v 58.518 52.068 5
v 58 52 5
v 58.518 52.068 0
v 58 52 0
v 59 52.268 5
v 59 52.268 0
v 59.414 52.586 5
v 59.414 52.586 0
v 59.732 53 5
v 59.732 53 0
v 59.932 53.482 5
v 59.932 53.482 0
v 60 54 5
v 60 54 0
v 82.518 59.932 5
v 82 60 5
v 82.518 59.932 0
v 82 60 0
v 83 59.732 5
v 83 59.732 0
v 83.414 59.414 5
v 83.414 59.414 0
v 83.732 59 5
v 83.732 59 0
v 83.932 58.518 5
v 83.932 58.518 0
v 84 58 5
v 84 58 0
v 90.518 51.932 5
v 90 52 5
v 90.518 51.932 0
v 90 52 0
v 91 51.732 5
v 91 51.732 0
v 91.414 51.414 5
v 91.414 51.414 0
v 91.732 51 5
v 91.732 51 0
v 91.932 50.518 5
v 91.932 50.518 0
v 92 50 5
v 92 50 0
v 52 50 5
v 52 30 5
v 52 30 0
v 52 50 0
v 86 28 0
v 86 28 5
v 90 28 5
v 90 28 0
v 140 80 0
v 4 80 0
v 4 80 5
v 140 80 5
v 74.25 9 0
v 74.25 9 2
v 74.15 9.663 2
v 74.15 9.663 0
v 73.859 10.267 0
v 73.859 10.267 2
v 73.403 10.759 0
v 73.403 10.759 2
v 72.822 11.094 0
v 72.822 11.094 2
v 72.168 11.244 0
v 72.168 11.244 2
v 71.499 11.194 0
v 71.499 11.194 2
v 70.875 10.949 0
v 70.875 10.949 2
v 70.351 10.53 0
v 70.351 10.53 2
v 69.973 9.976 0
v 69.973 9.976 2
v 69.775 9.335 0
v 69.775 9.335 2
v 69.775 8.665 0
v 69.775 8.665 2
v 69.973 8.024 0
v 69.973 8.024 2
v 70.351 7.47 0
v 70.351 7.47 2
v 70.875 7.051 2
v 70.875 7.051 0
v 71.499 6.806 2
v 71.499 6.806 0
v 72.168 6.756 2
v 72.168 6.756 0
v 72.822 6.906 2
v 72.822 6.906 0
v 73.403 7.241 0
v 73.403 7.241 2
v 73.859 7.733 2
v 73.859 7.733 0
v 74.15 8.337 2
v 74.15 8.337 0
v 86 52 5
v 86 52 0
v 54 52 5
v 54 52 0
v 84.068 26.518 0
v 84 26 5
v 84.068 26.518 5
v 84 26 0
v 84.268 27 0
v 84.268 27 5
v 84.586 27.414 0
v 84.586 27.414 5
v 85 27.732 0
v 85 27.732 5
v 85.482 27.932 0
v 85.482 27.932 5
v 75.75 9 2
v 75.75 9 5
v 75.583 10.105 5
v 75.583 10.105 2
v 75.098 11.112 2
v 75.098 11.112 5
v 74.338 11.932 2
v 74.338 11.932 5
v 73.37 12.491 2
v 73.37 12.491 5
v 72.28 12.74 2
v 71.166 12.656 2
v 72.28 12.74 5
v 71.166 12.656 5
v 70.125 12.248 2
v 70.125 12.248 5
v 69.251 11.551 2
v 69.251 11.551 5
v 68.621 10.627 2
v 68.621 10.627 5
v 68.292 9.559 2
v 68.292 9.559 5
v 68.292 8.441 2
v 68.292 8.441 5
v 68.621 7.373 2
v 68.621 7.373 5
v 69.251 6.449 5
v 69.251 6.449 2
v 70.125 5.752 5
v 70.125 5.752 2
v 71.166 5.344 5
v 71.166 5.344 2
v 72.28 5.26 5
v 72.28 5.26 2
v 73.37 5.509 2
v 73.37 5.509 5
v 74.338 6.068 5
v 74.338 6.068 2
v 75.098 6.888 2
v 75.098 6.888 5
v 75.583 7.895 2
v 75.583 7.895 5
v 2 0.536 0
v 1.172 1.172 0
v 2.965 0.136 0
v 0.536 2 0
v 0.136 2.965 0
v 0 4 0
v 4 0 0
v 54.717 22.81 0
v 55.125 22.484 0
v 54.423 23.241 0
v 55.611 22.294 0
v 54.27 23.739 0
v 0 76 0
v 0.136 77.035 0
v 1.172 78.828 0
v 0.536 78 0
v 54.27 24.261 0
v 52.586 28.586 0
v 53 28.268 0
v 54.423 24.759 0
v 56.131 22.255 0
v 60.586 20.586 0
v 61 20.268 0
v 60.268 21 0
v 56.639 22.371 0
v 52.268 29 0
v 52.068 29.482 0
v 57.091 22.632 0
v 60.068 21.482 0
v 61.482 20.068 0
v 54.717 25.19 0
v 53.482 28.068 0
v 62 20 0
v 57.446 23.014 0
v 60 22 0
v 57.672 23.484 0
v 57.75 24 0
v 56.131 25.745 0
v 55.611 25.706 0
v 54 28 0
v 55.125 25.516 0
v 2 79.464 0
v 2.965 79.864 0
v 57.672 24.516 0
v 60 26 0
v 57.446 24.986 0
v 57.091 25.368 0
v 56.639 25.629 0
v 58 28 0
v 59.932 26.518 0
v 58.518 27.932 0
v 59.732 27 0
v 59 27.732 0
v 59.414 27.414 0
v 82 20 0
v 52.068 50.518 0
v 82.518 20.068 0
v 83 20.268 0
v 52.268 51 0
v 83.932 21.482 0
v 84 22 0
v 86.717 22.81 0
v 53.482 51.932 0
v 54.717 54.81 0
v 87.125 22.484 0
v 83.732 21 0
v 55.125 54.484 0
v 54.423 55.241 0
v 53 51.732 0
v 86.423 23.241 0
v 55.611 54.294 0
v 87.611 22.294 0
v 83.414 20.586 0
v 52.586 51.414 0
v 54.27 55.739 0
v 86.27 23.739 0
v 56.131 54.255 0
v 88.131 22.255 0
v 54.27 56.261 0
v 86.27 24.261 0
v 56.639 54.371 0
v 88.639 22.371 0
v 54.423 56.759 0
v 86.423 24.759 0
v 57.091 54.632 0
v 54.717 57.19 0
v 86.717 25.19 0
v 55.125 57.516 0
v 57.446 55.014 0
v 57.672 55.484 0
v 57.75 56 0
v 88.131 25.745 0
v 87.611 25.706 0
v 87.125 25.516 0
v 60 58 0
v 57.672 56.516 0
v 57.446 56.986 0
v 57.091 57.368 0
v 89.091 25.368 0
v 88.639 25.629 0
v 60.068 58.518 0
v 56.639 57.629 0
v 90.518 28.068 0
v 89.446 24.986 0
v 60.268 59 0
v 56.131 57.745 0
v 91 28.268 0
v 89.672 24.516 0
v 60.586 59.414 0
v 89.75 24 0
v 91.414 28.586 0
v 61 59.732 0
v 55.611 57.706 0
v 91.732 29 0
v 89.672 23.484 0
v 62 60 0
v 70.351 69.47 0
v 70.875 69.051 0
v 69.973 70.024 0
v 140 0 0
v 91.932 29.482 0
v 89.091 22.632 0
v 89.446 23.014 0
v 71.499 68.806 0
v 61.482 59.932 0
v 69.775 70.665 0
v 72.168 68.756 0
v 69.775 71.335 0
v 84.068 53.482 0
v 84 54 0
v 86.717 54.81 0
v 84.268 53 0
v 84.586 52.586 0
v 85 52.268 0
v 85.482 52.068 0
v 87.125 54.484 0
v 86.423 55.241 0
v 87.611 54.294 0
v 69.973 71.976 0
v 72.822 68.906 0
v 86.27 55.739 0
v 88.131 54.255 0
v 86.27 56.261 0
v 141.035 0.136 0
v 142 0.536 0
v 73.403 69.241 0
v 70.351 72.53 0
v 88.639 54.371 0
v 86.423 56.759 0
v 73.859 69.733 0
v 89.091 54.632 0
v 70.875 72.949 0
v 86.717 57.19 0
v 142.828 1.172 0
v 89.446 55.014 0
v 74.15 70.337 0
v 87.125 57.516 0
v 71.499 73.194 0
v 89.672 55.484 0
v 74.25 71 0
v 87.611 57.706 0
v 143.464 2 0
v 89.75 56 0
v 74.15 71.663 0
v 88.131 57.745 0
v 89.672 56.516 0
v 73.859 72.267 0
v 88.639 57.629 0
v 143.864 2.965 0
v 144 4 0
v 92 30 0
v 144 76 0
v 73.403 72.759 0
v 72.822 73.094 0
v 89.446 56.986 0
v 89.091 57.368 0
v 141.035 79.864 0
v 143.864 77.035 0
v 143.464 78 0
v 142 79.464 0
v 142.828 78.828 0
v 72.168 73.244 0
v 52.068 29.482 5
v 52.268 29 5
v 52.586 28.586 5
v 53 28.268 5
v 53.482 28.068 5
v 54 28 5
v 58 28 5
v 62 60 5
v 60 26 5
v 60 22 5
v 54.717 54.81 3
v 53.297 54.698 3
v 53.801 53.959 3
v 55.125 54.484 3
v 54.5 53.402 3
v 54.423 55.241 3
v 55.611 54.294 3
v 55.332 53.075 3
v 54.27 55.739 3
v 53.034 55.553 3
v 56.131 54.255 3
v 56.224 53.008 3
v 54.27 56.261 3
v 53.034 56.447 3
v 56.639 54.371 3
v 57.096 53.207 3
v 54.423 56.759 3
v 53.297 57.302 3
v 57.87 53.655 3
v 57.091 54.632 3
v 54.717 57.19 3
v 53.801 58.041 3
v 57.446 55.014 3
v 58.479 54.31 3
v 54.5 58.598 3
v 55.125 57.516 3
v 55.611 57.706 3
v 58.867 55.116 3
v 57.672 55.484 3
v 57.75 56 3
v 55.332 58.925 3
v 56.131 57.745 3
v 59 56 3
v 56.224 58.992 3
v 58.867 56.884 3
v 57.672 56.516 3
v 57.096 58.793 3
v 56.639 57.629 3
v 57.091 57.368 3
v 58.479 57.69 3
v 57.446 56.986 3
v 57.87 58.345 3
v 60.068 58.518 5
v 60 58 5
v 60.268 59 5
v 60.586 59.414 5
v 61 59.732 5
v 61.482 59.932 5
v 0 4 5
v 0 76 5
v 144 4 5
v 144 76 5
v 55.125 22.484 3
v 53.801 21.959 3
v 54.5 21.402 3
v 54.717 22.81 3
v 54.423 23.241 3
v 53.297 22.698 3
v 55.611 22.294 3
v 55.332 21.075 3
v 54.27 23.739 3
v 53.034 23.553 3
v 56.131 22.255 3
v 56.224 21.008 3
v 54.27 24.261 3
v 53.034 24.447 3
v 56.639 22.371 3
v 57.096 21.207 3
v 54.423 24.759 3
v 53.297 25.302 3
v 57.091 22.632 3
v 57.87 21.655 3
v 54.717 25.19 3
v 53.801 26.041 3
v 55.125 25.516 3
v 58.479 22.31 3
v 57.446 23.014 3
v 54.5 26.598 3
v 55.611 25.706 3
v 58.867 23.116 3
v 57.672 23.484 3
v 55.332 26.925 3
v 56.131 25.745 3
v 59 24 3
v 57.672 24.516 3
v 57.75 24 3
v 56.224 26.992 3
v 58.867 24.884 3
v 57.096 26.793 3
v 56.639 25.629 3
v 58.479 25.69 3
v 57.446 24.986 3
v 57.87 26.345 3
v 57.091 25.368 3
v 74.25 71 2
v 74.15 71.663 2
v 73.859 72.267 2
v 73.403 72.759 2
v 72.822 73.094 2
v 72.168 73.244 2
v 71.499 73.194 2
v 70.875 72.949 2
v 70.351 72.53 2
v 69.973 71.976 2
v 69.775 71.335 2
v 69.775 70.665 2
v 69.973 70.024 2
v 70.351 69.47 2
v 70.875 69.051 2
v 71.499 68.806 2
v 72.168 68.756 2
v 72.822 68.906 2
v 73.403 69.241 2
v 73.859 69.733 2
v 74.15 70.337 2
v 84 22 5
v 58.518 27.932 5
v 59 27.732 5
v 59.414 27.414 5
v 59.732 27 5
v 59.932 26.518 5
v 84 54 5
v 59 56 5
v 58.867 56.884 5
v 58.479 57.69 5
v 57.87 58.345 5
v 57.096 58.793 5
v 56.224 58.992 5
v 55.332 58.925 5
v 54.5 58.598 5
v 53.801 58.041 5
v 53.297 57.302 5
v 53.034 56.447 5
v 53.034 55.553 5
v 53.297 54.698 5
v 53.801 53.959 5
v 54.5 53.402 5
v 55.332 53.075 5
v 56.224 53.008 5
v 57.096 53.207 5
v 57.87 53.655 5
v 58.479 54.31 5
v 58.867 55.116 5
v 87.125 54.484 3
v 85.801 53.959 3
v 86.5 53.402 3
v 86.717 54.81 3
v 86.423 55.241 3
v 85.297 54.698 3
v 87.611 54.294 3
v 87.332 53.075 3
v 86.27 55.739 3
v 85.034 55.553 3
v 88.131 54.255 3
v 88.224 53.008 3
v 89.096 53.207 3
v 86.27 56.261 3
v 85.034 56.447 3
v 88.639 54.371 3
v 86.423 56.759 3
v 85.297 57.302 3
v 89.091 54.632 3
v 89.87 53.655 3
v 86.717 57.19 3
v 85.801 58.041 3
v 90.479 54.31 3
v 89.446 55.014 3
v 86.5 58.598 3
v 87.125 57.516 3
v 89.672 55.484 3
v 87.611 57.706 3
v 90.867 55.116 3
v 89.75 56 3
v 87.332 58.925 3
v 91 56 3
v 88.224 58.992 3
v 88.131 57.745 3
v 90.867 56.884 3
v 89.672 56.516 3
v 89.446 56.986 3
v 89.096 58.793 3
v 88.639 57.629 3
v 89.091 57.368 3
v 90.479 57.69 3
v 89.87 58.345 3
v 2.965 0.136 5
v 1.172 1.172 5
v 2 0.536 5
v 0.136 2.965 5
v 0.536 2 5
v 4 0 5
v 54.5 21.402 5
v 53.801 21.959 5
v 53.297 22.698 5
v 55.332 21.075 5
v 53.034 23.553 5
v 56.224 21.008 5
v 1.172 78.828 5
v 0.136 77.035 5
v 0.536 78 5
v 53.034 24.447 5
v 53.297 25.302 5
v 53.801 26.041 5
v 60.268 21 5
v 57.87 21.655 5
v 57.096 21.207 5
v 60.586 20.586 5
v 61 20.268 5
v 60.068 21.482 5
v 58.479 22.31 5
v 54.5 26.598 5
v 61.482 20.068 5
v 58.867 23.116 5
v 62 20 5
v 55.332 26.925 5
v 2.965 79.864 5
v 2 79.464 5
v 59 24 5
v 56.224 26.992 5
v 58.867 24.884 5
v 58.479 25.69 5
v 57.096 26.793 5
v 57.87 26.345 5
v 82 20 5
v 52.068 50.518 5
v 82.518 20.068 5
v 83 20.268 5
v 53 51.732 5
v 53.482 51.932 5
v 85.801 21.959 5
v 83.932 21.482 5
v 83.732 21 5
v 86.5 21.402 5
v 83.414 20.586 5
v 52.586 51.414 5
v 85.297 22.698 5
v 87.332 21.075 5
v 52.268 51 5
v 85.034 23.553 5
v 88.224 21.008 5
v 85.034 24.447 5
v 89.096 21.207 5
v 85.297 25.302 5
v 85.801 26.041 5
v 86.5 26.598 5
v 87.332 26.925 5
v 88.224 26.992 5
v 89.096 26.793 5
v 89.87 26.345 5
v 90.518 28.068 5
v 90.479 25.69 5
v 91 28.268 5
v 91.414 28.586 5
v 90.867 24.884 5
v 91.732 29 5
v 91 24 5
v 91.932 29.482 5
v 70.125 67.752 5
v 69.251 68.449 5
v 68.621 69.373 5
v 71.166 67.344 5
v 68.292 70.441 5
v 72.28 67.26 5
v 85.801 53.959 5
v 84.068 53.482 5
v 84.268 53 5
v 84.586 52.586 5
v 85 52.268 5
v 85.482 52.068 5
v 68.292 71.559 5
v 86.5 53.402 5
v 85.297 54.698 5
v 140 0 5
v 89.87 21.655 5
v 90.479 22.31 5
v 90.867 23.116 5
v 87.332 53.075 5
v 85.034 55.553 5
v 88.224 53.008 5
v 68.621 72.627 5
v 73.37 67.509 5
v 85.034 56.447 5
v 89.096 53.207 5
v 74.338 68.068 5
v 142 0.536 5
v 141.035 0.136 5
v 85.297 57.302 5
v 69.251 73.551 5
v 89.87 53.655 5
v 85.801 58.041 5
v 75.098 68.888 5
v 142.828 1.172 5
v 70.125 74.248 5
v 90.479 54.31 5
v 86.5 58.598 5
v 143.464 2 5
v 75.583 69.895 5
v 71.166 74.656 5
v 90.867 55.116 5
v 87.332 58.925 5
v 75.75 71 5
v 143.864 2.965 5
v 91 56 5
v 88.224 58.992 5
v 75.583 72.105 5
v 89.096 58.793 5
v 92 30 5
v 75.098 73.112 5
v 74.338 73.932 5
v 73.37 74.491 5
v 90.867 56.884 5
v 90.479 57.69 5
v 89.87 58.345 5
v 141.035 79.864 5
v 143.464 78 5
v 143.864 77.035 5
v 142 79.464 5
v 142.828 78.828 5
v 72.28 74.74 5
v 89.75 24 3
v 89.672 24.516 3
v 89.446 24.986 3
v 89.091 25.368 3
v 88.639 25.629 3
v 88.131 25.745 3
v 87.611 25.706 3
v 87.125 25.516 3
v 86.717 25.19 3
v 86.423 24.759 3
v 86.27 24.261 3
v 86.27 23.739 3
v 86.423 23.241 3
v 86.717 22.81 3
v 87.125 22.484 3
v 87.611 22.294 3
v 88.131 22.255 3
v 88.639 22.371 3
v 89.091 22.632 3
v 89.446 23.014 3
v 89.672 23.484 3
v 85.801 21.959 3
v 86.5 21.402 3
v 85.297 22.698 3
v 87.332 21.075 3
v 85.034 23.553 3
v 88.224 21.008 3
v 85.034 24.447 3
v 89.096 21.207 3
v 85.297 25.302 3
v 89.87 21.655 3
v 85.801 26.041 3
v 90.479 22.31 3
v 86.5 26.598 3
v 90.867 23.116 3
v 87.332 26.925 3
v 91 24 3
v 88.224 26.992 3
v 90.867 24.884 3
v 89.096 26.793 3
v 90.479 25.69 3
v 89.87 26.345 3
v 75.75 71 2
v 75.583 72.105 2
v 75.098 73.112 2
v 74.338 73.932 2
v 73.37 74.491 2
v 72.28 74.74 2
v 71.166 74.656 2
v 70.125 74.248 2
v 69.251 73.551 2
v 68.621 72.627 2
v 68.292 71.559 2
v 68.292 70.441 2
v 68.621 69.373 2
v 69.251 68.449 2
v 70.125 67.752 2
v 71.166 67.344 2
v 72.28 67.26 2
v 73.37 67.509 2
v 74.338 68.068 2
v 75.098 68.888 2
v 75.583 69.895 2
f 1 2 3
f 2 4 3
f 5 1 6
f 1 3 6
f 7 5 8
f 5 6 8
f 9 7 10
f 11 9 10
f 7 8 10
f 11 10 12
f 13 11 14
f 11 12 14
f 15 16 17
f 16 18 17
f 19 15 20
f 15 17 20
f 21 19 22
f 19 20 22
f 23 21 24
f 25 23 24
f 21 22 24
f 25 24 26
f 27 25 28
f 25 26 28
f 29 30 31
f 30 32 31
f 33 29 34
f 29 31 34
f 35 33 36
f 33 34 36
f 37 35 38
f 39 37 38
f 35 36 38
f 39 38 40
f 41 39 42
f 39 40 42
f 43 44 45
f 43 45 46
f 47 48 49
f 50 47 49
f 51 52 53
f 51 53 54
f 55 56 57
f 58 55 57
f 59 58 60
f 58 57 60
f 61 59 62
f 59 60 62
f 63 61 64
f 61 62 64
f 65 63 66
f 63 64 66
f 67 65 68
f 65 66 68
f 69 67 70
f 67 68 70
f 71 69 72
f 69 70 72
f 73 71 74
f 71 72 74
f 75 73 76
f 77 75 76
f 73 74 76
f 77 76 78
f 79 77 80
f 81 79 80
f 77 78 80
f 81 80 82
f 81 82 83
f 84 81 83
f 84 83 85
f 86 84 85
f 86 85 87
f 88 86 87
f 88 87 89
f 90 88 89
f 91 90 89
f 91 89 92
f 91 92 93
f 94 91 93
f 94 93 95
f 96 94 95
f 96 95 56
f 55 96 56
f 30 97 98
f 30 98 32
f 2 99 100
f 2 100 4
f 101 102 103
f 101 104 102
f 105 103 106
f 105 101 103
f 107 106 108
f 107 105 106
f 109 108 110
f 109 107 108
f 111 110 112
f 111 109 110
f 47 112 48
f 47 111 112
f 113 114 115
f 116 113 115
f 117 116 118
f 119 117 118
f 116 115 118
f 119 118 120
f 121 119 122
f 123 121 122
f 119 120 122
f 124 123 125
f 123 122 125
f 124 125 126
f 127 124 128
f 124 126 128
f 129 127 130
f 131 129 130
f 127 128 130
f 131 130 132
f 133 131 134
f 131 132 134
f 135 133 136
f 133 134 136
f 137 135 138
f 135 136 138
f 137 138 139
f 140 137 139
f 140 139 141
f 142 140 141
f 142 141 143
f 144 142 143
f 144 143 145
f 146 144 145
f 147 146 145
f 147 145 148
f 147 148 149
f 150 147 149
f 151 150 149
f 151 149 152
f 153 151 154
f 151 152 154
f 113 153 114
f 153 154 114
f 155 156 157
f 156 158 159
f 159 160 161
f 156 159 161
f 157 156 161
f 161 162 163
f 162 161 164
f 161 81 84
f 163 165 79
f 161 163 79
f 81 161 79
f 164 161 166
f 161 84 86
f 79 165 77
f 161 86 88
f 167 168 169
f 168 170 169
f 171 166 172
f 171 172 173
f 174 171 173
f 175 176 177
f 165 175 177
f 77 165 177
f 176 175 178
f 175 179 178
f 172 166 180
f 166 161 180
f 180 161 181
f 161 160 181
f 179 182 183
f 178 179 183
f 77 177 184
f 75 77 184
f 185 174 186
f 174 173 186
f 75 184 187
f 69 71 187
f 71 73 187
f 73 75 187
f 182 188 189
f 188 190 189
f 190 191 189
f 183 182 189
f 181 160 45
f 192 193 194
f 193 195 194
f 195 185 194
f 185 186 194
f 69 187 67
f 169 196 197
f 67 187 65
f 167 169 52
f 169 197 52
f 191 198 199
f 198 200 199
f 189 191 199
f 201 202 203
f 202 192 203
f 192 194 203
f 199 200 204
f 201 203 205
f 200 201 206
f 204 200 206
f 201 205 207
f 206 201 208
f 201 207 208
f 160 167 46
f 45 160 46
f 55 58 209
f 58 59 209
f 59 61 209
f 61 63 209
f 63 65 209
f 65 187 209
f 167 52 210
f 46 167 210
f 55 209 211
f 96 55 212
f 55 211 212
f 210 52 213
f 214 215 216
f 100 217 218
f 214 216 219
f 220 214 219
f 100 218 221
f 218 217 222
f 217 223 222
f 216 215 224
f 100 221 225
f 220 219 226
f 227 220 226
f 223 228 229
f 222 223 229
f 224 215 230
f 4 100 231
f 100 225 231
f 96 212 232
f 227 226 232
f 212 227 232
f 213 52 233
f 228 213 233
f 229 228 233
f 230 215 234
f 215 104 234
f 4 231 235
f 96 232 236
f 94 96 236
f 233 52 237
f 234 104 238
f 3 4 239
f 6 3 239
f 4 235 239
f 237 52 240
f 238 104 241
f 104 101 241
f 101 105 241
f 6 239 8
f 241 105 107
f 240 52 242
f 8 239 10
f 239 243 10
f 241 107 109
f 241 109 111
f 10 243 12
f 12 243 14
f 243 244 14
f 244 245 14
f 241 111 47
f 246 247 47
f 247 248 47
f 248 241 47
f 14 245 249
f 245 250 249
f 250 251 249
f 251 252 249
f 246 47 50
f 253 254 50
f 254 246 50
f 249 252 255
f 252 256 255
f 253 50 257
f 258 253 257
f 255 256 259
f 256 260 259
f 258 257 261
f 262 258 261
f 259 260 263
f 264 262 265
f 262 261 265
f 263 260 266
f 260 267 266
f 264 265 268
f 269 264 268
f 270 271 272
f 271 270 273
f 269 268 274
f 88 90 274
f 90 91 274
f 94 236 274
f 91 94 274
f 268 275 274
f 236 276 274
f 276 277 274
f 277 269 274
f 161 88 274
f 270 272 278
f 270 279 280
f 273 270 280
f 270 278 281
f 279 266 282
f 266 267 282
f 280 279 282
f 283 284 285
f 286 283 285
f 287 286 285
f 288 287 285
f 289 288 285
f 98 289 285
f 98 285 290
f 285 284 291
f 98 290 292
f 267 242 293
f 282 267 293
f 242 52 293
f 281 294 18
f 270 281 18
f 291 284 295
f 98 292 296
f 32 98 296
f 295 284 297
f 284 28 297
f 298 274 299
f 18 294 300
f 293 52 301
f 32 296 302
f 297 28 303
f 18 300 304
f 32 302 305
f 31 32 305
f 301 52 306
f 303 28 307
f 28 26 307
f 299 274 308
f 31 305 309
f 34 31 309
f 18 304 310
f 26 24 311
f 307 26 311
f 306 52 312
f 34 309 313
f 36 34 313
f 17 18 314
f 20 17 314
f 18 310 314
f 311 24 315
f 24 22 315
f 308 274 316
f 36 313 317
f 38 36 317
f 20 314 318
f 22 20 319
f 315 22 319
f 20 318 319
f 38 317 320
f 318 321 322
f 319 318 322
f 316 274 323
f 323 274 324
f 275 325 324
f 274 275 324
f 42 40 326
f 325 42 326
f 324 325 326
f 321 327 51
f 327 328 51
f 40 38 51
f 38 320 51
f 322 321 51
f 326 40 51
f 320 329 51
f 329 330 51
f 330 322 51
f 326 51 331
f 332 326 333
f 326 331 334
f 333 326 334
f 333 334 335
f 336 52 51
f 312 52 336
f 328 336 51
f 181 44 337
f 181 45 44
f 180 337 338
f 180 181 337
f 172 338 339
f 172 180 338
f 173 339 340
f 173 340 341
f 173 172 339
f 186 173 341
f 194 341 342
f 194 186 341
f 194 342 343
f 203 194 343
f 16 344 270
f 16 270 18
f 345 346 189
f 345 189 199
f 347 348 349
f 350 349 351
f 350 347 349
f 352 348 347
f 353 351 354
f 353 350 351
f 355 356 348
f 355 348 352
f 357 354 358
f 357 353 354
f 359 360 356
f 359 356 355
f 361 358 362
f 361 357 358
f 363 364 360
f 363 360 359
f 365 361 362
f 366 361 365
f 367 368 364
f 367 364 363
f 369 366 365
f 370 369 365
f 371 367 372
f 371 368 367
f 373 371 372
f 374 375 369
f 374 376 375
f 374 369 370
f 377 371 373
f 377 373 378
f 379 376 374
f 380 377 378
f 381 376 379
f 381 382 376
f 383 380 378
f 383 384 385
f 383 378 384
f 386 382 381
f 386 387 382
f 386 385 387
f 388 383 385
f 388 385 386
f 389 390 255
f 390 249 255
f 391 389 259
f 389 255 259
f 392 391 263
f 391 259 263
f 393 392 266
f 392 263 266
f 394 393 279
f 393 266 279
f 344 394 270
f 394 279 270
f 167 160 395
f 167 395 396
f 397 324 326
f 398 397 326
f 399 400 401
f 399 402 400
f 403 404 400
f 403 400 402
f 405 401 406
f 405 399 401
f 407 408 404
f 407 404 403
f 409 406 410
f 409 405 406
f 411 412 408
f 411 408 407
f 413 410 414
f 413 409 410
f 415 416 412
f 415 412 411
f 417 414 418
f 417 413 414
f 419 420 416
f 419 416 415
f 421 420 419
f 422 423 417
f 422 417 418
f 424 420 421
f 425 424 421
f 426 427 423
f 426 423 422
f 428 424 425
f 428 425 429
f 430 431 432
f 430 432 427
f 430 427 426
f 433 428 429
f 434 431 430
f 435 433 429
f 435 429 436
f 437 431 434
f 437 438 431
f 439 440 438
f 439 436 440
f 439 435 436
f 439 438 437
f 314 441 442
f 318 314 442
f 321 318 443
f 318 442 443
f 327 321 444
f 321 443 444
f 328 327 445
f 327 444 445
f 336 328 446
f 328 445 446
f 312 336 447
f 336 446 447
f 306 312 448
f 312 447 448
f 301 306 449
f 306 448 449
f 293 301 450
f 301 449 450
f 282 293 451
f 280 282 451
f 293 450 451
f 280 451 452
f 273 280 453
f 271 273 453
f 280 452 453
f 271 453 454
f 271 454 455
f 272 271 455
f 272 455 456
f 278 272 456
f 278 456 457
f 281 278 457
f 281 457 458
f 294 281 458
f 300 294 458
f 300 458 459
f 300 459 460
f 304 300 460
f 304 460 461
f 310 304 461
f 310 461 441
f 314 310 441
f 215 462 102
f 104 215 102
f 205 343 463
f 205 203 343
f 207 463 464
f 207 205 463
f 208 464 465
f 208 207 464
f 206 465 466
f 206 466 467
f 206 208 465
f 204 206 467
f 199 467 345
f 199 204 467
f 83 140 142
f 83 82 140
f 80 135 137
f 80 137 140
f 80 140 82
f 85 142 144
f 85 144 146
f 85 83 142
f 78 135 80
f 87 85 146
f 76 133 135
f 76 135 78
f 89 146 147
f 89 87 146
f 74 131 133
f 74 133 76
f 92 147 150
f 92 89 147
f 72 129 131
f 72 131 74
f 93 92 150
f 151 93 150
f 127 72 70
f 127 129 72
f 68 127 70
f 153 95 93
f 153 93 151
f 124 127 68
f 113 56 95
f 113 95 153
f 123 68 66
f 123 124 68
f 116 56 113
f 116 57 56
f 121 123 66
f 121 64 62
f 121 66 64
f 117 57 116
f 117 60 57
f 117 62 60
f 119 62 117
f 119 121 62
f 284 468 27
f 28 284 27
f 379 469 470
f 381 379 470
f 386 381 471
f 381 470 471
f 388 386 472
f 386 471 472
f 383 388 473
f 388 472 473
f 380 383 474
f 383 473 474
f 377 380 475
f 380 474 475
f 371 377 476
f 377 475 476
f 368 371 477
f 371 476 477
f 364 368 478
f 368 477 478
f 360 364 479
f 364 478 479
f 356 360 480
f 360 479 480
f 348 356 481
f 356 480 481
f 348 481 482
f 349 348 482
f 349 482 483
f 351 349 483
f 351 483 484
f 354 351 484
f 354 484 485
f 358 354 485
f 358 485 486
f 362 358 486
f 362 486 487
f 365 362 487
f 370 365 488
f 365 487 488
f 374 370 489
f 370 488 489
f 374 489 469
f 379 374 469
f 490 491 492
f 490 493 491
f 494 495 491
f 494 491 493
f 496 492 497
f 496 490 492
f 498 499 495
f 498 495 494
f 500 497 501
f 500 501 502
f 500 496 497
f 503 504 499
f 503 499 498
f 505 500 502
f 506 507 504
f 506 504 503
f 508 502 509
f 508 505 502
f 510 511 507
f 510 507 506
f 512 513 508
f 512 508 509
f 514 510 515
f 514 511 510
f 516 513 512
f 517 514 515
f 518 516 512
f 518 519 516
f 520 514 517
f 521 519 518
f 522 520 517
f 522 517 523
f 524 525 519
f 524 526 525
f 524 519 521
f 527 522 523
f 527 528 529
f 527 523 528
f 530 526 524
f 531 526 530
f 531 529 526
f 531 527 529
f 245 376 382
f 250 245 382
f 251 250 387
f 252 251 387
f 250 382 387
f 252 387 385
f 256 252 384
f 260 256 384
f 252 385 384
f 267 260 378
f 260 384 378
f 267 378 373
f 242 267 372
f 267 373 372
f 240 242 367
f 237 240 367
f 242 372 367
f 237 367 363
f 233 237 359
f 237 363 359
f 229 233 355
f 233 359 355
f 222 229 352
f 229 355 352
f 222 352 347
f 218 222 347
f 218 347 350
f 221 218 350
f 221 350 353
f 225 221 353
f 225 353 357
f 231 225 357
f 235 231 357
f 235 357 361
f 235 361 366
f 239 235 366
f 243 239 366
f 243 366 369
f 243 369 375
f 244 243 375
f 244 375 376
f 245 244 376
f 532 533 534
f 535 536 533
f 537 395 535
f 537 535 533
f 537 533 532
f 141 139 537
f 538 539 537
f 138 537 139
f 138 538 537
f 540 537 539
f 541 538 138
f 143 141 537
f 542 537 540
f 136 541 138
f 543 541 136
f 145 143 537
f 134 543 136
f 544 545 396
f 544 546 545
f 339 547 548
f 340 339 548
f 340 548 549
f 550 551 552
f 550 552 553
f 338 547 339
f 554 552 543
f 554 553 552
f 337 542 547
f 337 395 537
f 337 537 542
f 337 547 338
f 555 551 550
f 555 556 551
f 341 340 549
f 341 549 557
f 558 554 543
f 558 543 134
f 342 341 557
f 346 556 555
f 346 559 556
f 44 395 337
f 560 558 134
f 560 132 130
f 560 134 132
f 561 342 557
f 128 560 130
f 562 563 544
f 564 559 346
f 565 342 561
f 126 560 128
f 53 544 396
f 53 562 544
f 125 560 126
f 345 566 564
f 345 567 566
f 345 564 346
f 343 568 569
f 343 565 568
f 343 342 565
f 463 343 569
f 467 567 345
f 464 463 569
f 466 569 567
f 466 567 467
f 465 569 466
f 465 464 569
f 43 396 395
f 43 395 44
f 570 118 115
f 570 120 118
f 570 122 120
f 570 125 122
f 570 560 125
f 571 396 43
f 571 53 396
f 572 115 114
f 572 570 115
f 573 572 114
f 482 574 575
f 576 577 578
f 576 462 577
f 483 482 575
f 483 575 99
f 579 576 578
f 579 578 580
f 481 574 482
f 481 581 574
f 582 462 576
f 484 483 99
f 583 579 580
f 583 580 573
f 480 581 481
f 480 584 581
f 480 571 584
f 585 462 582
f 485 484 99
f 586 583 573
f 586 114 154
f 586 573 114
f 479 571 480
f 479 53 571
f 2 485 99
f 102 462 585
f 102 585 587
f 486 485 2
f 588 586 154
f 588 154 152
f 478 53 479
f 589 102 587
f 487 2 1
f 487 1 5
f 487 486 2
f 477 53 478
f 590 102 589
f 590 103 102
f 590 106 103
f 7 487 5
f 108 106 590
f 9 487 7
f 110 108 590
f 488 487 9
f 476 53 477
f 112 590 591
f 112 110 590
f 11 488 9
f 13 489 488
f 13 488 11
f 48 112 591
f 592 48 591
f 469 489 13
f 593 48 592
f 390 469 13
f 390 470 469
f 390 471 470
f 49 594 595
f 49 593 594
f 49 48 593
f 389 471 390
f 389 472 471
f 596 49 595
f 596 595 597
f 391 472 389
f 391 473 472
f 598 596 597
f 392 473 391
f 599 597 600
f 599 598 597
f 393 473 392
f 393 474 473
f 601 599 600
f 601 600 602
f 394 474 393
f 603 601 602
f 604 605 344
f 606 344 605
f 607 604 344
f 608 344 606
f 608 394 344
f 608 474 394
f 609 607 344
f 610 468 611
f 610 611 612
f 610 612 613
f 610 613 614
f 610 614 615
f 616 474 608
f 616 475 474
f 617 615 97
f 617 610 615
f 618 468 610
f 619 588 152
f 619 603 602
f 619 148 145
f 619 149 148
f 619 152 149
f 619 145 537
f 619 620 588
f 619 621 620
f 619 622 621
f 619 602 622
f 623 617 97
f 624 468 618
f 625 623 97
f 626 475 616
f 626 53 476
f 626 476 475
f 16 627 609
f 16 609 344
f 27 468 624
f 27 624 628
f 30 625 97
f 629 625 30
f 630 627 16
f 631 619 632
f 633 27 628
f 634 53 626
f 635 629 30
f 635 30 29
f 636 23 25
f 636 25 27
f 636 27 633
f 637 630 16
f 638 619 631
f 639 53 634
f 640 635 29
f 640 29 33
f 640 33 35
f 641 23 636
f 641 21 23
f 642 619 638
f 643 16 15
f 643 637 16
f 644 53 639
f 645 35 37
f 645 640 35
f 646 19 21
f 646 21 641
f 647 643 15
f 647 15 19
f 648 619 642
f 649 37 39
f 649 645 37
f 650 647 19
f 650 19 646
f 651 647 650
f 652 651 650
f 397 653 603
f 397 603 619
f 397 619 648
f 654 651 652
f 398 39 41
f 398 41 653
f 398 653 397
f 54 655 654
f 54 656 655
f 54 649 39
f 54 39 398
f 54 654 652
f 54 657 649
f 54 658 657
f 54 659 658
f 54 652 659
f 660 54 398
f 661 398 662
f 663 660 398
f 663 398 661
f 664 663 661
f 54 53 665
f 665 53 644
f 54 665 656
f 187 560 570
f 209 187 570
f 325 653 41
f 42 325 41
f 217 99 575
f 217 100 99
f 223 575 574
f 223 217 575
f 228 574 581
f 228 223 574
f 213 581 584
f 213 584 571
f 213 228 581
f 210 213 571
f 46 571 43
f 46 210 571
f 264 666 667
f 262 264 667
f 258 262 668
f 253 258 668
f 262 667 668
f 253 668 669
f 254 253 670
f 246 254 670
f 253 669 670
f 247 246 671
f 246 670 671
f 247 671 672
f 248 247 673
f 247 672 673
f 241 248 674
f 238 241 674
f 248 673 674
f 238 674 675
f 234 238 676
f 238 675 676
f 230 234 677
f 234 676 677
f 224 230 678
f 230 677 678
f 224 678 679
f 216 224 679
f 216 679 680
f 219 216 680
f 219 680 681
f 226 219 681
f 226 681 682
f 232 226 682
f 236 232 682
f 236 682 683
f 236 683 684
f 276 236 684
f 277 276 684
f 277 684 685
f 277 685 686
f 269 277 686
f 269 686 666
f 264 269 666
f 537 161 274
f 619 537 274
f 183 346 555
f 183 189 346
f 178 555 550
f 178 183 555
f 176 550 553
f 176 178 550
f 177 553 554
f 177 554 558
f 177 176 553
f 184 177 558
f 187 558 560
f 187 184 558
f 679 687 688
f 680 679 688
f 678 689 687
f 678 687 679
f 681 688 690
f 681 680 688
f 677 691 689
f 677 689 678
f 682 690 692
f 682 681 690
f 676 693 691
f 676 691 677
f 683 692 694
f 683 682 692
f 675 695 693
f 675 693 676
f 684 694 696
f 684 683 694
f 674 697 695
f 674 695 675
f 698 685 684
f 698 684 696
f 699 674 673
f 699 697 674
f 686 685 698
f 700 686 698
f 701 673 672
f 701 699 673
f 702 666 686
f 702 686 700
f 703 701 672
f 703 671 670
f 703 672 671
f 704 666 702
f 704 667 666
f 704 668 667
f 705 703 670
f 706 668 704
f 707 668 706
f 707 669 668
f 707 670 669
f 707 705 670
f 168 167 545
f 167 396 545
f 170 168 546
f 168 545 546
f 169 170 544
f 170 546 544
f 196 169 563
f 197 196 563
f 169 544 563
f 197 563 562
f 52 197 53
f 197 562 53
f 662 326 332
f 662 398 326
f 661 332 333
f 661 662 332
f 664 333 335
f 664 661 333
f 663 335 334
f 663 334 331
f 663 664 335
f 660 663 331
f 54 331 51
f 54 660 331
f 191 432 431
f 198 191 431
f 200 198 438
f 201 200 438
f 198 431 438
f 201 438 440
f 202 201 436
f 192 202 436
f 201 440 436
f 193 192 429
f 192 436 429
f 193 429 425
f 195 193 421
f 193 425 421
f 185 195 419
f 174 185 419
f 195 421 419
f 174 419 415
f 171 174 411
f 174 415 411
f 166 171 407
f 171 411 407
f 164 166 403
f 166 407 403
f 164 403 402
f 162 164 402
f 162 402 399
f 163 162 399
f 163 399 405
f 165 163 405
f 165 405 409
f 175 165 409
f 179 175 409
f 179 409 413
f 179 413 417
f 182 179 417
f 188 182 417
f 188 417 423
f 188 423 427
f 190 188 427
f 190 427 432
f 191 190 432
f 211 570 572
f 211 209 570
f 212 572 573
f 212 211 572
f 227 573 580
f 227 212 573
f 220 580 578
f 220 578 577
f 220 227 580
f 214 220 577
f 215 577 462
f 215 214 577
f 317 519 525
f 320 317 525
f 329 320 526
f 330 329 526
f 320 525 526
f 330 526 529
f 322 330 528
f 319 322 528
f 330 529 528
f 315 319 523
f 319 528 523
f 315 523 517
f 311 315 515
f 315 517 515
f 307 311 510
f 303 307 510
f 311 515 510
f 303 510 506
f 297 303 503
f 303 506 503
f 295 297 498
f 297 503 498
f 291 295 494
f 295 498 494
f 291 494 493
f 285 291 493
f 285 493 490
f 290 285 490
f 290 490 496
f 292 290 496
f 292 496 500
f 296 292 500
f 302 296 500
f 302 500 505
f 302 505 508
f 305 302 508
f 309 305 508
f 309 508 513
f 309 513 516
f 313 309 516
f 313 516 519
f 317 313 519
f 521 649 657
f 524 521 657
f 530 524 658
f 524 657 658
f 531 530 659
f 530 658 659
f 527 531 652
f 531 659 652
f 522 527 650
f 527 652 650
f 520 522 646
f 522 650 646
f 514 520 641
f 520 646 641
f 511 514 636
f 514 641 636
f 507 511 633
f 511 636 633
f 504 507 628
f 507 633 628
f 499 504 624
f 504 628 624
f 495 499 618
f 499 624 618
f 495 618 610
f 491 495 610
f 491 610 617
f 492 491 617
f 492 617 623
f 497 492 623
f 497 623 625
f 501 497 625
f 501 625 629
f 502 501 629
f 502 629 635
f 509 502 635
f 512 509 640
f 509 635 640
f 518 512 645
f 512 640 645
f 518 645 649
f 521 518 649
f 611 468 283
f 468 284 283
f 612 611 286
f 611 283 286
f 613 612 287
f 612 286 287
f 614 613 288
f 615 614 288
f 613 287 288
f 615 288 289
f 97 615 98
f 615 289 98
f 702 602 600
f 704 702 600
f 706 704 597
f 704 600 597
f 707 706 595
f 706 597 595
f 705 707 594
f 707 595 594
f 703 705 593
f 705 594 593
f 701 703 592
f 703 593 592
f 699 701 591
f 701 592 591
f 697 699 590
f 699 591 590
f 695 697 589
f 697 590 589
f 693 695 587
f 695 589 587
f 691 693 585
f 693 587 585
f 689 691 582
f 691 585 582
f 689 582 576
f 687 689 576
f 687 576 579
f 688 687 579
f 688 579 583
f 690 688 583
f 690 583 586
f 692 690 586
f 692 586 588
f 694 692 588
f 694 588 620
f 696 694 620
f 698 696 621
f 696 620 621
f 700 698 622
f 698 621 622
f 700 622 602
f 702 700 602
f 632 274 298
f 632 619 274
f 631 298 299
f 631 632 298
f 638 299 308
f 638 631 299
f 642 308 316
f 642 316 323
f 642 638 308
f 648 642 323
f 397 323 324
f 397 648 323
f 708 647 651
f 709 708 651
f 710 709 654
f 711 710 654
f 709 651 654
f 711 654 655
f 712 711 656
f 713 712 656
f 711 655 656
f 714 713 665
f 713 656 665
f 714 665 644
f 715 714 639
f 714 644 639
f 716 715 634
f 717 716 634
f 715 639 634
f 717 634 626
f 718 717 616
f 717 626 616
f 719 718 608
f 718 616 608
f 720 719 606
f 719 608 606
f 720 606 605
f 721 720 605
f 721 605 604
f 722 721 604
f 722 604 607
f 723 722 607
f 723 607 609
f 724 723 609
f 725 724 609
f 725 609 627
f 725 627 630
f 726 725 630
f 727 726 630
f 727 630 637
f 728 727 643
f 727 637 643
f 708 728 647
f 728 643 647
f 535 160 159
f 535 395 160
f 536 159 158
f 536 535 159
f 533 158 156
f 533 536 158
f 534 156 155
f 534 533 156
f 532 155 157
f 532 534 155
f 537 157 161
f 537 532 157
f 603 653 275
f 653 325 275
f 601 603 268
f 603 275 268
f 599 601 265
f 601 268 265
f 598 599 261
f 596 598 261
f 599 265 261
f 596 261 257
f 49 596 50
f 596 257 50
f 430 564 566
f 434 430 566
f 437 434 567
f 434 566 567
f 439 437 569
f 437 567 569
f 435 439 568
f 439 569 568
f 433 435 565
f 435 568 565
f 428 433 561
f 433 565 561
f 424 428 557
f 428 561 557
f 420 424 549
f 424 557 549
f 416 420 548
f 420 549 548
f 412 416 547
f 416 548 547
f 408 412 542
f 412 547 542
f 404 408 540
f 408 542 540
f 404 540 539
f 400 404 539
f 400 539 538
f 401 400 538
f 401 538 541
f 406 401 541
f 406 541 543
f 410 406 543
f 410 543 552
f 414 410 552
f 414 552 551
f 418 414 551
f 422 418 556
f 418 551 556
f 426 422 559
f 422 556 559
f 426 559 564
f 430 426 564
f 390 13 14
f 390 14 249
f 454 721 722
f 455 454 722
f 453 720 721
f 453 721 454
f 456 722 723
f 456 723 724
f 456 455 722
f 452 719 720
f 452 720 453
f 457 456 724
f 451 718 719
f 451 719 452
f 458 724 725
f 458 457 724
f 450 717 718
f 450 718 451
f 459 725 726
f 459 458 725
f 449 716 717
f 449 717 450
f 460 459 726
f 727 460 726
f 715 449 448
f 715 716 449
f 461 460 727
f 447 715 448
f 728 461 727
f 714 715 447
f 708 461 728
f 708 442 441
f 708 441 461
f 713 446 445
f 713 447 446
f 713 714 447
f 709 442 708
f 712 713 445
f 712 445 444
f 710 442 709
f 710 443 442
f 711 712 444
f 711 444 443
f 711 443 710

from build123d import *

# Parameters (mm, degrees)
SKETCH_W        = 144
SKETCH_H        = 80
PAD_DEPTH       = 5
FILLET_R        = 4
SKETCH001_R     = 2.25
POCKET_DEPTH    = 10
SKETCH002_R     = 3.75
POCKET001_DEPTH = 3
SKETCH003_W     = 40
SKETCH003_H     = 40
POCKET002_DEPTH = 5
SKETCH004_W     = 8
SKETCH004_H     = 8
PAD001_DEPTH    = 5
SKETCH005_R     = 1.75
POCKET003_DEPTH = 5
FILLET001_R     = 2
SKETCH006_R     = 3
POCKET004_DEPTH = 2


with BuildPart() as part:
    # Sketch → Pad (new body)
    with BuildSketch(Plane.XY):
        with Locations((72, 40)):
            Rectangle(SKETCH_W, SKETCH_H)
    extrude(amount=PAD_DEPTH)

    # Fillet
    fillet_edges = [part.edges().sort_by_distance(p)[0] for p in [
        (144, 0, 2.5),
        (144, 80, 2.5),
        (0, 0, 2.5),
        (0, 80, 2.5),
    ]]
    fillet(fillet_edges, radius=FILLET_R)

    # Sketch001 (on Face5 of Fillet) → Pocket (cut)
    with BuildSketch(Plane.XY.offset(5)):
        with Locations((72, 9)):
            Circle(SKETCH001_R)
        with Locations((72, 71)):
            Circle(SKETCH001_R)
    extrude(amount=-POCKET_DEPTH, mode=Mode.SUBTRACT)

    # Sketch002 (on Face5 of Pocket) → Pocket001 (cut)
    with BuildSketch(Plane.XY.offset(5)):
        with Locations((72, 9)):
            Circle(SKETCH002_R)
        with Locations((72, 71)):
            Circle(SKETCH002_R)
    extrude(amount=-POCKET001_DEPTH, mode=Mode.SUBTRACT)

    # Sketch003 (on Face5 of Pocket001) → Pocket002 (cut)
    with BuildSketch(Plane.XY.offset(5)):
        with Locations((72, 40)):
            Rectangle(SKETCH003_W, SKETCH003_H)
    extrude(amount=-POCKET002_DEPTH, mode=Mode.SUBTRACT)

    # Sketch004 (on Face5 of Pocket002) → Pad001 (join)
    with BuildSketch(Plane.XY.offset(5)):
        with Locations((56, 56)):
            Rectangle(SKETCH004_W, SKETCH004_H)
        with Locations((56, 24)):
            Rectangle(SKETCH004_W, SKETCH004_H)
        with Locations((88, 24)):
            Rectangle(SKETCH004_W, SKETCH004_H)
        with Locations((88, 56)):
            Rectangle(SKETCH004_W, SKETCH004_H)
    extrude(amount=-PAD001_DEPTH)

    # Sketch005 (on Face28 of Pad001) → Pocket003 (cut)
    with BuildSketch(Plane.XY.offset(5)):
        with Locations((56, 56)):
            Circle(SKETCH005_R)
        with Locations((88, 56)):
            Circle(SKETCH005_R)
        with Locations((56, 24)):
            Circle(SKETCH005_R)
        with Locations((88, 24)):
            Circle(SKETCH005_R)
    extrude(amount=-POCKET003_DEPTH, mode=Mode.SUBTRACT)

    # Fillet001
    fillet001_edges = [part.edges().sort_by_distance(p)[0] for p in [
        (60, 52, 2.5),
        (60, 60, 2.5),
        (52, 52, 2.5),
        (52, 28, 2.5),
        (60, 28, 2.5),
        (60, 20, 2.5),
        (84, 28, 2.5),
        (92, 28, 2.5),
        (84, 20, 2.5),
        (84, 60, 2.5),
        (84, 52, 2.5),
        (92, 52, 2.5),
    ]]
    fillet(fillet001_edges, radius=FILLET001_R)

    # Sketch006 (on Face40 of Fillet001) → Pocket004 (cut)
    with BuildSketch(Plane.XY.offset(5)):
        with Locations((56, 24)):
            Circle(SKETCH006_R)
        with Locations((56, 56)):
            Circle(SKETCH006_R)
        with Locations((88, 56)):
            Circle(SKETCH006_R)
        with Locations((88, 24)):
            Circle(SKETCH006_R)
    extrude(amount=-POCKET004_DEPTH, mode=Mode.SUBTRACT)


solid = part.part
